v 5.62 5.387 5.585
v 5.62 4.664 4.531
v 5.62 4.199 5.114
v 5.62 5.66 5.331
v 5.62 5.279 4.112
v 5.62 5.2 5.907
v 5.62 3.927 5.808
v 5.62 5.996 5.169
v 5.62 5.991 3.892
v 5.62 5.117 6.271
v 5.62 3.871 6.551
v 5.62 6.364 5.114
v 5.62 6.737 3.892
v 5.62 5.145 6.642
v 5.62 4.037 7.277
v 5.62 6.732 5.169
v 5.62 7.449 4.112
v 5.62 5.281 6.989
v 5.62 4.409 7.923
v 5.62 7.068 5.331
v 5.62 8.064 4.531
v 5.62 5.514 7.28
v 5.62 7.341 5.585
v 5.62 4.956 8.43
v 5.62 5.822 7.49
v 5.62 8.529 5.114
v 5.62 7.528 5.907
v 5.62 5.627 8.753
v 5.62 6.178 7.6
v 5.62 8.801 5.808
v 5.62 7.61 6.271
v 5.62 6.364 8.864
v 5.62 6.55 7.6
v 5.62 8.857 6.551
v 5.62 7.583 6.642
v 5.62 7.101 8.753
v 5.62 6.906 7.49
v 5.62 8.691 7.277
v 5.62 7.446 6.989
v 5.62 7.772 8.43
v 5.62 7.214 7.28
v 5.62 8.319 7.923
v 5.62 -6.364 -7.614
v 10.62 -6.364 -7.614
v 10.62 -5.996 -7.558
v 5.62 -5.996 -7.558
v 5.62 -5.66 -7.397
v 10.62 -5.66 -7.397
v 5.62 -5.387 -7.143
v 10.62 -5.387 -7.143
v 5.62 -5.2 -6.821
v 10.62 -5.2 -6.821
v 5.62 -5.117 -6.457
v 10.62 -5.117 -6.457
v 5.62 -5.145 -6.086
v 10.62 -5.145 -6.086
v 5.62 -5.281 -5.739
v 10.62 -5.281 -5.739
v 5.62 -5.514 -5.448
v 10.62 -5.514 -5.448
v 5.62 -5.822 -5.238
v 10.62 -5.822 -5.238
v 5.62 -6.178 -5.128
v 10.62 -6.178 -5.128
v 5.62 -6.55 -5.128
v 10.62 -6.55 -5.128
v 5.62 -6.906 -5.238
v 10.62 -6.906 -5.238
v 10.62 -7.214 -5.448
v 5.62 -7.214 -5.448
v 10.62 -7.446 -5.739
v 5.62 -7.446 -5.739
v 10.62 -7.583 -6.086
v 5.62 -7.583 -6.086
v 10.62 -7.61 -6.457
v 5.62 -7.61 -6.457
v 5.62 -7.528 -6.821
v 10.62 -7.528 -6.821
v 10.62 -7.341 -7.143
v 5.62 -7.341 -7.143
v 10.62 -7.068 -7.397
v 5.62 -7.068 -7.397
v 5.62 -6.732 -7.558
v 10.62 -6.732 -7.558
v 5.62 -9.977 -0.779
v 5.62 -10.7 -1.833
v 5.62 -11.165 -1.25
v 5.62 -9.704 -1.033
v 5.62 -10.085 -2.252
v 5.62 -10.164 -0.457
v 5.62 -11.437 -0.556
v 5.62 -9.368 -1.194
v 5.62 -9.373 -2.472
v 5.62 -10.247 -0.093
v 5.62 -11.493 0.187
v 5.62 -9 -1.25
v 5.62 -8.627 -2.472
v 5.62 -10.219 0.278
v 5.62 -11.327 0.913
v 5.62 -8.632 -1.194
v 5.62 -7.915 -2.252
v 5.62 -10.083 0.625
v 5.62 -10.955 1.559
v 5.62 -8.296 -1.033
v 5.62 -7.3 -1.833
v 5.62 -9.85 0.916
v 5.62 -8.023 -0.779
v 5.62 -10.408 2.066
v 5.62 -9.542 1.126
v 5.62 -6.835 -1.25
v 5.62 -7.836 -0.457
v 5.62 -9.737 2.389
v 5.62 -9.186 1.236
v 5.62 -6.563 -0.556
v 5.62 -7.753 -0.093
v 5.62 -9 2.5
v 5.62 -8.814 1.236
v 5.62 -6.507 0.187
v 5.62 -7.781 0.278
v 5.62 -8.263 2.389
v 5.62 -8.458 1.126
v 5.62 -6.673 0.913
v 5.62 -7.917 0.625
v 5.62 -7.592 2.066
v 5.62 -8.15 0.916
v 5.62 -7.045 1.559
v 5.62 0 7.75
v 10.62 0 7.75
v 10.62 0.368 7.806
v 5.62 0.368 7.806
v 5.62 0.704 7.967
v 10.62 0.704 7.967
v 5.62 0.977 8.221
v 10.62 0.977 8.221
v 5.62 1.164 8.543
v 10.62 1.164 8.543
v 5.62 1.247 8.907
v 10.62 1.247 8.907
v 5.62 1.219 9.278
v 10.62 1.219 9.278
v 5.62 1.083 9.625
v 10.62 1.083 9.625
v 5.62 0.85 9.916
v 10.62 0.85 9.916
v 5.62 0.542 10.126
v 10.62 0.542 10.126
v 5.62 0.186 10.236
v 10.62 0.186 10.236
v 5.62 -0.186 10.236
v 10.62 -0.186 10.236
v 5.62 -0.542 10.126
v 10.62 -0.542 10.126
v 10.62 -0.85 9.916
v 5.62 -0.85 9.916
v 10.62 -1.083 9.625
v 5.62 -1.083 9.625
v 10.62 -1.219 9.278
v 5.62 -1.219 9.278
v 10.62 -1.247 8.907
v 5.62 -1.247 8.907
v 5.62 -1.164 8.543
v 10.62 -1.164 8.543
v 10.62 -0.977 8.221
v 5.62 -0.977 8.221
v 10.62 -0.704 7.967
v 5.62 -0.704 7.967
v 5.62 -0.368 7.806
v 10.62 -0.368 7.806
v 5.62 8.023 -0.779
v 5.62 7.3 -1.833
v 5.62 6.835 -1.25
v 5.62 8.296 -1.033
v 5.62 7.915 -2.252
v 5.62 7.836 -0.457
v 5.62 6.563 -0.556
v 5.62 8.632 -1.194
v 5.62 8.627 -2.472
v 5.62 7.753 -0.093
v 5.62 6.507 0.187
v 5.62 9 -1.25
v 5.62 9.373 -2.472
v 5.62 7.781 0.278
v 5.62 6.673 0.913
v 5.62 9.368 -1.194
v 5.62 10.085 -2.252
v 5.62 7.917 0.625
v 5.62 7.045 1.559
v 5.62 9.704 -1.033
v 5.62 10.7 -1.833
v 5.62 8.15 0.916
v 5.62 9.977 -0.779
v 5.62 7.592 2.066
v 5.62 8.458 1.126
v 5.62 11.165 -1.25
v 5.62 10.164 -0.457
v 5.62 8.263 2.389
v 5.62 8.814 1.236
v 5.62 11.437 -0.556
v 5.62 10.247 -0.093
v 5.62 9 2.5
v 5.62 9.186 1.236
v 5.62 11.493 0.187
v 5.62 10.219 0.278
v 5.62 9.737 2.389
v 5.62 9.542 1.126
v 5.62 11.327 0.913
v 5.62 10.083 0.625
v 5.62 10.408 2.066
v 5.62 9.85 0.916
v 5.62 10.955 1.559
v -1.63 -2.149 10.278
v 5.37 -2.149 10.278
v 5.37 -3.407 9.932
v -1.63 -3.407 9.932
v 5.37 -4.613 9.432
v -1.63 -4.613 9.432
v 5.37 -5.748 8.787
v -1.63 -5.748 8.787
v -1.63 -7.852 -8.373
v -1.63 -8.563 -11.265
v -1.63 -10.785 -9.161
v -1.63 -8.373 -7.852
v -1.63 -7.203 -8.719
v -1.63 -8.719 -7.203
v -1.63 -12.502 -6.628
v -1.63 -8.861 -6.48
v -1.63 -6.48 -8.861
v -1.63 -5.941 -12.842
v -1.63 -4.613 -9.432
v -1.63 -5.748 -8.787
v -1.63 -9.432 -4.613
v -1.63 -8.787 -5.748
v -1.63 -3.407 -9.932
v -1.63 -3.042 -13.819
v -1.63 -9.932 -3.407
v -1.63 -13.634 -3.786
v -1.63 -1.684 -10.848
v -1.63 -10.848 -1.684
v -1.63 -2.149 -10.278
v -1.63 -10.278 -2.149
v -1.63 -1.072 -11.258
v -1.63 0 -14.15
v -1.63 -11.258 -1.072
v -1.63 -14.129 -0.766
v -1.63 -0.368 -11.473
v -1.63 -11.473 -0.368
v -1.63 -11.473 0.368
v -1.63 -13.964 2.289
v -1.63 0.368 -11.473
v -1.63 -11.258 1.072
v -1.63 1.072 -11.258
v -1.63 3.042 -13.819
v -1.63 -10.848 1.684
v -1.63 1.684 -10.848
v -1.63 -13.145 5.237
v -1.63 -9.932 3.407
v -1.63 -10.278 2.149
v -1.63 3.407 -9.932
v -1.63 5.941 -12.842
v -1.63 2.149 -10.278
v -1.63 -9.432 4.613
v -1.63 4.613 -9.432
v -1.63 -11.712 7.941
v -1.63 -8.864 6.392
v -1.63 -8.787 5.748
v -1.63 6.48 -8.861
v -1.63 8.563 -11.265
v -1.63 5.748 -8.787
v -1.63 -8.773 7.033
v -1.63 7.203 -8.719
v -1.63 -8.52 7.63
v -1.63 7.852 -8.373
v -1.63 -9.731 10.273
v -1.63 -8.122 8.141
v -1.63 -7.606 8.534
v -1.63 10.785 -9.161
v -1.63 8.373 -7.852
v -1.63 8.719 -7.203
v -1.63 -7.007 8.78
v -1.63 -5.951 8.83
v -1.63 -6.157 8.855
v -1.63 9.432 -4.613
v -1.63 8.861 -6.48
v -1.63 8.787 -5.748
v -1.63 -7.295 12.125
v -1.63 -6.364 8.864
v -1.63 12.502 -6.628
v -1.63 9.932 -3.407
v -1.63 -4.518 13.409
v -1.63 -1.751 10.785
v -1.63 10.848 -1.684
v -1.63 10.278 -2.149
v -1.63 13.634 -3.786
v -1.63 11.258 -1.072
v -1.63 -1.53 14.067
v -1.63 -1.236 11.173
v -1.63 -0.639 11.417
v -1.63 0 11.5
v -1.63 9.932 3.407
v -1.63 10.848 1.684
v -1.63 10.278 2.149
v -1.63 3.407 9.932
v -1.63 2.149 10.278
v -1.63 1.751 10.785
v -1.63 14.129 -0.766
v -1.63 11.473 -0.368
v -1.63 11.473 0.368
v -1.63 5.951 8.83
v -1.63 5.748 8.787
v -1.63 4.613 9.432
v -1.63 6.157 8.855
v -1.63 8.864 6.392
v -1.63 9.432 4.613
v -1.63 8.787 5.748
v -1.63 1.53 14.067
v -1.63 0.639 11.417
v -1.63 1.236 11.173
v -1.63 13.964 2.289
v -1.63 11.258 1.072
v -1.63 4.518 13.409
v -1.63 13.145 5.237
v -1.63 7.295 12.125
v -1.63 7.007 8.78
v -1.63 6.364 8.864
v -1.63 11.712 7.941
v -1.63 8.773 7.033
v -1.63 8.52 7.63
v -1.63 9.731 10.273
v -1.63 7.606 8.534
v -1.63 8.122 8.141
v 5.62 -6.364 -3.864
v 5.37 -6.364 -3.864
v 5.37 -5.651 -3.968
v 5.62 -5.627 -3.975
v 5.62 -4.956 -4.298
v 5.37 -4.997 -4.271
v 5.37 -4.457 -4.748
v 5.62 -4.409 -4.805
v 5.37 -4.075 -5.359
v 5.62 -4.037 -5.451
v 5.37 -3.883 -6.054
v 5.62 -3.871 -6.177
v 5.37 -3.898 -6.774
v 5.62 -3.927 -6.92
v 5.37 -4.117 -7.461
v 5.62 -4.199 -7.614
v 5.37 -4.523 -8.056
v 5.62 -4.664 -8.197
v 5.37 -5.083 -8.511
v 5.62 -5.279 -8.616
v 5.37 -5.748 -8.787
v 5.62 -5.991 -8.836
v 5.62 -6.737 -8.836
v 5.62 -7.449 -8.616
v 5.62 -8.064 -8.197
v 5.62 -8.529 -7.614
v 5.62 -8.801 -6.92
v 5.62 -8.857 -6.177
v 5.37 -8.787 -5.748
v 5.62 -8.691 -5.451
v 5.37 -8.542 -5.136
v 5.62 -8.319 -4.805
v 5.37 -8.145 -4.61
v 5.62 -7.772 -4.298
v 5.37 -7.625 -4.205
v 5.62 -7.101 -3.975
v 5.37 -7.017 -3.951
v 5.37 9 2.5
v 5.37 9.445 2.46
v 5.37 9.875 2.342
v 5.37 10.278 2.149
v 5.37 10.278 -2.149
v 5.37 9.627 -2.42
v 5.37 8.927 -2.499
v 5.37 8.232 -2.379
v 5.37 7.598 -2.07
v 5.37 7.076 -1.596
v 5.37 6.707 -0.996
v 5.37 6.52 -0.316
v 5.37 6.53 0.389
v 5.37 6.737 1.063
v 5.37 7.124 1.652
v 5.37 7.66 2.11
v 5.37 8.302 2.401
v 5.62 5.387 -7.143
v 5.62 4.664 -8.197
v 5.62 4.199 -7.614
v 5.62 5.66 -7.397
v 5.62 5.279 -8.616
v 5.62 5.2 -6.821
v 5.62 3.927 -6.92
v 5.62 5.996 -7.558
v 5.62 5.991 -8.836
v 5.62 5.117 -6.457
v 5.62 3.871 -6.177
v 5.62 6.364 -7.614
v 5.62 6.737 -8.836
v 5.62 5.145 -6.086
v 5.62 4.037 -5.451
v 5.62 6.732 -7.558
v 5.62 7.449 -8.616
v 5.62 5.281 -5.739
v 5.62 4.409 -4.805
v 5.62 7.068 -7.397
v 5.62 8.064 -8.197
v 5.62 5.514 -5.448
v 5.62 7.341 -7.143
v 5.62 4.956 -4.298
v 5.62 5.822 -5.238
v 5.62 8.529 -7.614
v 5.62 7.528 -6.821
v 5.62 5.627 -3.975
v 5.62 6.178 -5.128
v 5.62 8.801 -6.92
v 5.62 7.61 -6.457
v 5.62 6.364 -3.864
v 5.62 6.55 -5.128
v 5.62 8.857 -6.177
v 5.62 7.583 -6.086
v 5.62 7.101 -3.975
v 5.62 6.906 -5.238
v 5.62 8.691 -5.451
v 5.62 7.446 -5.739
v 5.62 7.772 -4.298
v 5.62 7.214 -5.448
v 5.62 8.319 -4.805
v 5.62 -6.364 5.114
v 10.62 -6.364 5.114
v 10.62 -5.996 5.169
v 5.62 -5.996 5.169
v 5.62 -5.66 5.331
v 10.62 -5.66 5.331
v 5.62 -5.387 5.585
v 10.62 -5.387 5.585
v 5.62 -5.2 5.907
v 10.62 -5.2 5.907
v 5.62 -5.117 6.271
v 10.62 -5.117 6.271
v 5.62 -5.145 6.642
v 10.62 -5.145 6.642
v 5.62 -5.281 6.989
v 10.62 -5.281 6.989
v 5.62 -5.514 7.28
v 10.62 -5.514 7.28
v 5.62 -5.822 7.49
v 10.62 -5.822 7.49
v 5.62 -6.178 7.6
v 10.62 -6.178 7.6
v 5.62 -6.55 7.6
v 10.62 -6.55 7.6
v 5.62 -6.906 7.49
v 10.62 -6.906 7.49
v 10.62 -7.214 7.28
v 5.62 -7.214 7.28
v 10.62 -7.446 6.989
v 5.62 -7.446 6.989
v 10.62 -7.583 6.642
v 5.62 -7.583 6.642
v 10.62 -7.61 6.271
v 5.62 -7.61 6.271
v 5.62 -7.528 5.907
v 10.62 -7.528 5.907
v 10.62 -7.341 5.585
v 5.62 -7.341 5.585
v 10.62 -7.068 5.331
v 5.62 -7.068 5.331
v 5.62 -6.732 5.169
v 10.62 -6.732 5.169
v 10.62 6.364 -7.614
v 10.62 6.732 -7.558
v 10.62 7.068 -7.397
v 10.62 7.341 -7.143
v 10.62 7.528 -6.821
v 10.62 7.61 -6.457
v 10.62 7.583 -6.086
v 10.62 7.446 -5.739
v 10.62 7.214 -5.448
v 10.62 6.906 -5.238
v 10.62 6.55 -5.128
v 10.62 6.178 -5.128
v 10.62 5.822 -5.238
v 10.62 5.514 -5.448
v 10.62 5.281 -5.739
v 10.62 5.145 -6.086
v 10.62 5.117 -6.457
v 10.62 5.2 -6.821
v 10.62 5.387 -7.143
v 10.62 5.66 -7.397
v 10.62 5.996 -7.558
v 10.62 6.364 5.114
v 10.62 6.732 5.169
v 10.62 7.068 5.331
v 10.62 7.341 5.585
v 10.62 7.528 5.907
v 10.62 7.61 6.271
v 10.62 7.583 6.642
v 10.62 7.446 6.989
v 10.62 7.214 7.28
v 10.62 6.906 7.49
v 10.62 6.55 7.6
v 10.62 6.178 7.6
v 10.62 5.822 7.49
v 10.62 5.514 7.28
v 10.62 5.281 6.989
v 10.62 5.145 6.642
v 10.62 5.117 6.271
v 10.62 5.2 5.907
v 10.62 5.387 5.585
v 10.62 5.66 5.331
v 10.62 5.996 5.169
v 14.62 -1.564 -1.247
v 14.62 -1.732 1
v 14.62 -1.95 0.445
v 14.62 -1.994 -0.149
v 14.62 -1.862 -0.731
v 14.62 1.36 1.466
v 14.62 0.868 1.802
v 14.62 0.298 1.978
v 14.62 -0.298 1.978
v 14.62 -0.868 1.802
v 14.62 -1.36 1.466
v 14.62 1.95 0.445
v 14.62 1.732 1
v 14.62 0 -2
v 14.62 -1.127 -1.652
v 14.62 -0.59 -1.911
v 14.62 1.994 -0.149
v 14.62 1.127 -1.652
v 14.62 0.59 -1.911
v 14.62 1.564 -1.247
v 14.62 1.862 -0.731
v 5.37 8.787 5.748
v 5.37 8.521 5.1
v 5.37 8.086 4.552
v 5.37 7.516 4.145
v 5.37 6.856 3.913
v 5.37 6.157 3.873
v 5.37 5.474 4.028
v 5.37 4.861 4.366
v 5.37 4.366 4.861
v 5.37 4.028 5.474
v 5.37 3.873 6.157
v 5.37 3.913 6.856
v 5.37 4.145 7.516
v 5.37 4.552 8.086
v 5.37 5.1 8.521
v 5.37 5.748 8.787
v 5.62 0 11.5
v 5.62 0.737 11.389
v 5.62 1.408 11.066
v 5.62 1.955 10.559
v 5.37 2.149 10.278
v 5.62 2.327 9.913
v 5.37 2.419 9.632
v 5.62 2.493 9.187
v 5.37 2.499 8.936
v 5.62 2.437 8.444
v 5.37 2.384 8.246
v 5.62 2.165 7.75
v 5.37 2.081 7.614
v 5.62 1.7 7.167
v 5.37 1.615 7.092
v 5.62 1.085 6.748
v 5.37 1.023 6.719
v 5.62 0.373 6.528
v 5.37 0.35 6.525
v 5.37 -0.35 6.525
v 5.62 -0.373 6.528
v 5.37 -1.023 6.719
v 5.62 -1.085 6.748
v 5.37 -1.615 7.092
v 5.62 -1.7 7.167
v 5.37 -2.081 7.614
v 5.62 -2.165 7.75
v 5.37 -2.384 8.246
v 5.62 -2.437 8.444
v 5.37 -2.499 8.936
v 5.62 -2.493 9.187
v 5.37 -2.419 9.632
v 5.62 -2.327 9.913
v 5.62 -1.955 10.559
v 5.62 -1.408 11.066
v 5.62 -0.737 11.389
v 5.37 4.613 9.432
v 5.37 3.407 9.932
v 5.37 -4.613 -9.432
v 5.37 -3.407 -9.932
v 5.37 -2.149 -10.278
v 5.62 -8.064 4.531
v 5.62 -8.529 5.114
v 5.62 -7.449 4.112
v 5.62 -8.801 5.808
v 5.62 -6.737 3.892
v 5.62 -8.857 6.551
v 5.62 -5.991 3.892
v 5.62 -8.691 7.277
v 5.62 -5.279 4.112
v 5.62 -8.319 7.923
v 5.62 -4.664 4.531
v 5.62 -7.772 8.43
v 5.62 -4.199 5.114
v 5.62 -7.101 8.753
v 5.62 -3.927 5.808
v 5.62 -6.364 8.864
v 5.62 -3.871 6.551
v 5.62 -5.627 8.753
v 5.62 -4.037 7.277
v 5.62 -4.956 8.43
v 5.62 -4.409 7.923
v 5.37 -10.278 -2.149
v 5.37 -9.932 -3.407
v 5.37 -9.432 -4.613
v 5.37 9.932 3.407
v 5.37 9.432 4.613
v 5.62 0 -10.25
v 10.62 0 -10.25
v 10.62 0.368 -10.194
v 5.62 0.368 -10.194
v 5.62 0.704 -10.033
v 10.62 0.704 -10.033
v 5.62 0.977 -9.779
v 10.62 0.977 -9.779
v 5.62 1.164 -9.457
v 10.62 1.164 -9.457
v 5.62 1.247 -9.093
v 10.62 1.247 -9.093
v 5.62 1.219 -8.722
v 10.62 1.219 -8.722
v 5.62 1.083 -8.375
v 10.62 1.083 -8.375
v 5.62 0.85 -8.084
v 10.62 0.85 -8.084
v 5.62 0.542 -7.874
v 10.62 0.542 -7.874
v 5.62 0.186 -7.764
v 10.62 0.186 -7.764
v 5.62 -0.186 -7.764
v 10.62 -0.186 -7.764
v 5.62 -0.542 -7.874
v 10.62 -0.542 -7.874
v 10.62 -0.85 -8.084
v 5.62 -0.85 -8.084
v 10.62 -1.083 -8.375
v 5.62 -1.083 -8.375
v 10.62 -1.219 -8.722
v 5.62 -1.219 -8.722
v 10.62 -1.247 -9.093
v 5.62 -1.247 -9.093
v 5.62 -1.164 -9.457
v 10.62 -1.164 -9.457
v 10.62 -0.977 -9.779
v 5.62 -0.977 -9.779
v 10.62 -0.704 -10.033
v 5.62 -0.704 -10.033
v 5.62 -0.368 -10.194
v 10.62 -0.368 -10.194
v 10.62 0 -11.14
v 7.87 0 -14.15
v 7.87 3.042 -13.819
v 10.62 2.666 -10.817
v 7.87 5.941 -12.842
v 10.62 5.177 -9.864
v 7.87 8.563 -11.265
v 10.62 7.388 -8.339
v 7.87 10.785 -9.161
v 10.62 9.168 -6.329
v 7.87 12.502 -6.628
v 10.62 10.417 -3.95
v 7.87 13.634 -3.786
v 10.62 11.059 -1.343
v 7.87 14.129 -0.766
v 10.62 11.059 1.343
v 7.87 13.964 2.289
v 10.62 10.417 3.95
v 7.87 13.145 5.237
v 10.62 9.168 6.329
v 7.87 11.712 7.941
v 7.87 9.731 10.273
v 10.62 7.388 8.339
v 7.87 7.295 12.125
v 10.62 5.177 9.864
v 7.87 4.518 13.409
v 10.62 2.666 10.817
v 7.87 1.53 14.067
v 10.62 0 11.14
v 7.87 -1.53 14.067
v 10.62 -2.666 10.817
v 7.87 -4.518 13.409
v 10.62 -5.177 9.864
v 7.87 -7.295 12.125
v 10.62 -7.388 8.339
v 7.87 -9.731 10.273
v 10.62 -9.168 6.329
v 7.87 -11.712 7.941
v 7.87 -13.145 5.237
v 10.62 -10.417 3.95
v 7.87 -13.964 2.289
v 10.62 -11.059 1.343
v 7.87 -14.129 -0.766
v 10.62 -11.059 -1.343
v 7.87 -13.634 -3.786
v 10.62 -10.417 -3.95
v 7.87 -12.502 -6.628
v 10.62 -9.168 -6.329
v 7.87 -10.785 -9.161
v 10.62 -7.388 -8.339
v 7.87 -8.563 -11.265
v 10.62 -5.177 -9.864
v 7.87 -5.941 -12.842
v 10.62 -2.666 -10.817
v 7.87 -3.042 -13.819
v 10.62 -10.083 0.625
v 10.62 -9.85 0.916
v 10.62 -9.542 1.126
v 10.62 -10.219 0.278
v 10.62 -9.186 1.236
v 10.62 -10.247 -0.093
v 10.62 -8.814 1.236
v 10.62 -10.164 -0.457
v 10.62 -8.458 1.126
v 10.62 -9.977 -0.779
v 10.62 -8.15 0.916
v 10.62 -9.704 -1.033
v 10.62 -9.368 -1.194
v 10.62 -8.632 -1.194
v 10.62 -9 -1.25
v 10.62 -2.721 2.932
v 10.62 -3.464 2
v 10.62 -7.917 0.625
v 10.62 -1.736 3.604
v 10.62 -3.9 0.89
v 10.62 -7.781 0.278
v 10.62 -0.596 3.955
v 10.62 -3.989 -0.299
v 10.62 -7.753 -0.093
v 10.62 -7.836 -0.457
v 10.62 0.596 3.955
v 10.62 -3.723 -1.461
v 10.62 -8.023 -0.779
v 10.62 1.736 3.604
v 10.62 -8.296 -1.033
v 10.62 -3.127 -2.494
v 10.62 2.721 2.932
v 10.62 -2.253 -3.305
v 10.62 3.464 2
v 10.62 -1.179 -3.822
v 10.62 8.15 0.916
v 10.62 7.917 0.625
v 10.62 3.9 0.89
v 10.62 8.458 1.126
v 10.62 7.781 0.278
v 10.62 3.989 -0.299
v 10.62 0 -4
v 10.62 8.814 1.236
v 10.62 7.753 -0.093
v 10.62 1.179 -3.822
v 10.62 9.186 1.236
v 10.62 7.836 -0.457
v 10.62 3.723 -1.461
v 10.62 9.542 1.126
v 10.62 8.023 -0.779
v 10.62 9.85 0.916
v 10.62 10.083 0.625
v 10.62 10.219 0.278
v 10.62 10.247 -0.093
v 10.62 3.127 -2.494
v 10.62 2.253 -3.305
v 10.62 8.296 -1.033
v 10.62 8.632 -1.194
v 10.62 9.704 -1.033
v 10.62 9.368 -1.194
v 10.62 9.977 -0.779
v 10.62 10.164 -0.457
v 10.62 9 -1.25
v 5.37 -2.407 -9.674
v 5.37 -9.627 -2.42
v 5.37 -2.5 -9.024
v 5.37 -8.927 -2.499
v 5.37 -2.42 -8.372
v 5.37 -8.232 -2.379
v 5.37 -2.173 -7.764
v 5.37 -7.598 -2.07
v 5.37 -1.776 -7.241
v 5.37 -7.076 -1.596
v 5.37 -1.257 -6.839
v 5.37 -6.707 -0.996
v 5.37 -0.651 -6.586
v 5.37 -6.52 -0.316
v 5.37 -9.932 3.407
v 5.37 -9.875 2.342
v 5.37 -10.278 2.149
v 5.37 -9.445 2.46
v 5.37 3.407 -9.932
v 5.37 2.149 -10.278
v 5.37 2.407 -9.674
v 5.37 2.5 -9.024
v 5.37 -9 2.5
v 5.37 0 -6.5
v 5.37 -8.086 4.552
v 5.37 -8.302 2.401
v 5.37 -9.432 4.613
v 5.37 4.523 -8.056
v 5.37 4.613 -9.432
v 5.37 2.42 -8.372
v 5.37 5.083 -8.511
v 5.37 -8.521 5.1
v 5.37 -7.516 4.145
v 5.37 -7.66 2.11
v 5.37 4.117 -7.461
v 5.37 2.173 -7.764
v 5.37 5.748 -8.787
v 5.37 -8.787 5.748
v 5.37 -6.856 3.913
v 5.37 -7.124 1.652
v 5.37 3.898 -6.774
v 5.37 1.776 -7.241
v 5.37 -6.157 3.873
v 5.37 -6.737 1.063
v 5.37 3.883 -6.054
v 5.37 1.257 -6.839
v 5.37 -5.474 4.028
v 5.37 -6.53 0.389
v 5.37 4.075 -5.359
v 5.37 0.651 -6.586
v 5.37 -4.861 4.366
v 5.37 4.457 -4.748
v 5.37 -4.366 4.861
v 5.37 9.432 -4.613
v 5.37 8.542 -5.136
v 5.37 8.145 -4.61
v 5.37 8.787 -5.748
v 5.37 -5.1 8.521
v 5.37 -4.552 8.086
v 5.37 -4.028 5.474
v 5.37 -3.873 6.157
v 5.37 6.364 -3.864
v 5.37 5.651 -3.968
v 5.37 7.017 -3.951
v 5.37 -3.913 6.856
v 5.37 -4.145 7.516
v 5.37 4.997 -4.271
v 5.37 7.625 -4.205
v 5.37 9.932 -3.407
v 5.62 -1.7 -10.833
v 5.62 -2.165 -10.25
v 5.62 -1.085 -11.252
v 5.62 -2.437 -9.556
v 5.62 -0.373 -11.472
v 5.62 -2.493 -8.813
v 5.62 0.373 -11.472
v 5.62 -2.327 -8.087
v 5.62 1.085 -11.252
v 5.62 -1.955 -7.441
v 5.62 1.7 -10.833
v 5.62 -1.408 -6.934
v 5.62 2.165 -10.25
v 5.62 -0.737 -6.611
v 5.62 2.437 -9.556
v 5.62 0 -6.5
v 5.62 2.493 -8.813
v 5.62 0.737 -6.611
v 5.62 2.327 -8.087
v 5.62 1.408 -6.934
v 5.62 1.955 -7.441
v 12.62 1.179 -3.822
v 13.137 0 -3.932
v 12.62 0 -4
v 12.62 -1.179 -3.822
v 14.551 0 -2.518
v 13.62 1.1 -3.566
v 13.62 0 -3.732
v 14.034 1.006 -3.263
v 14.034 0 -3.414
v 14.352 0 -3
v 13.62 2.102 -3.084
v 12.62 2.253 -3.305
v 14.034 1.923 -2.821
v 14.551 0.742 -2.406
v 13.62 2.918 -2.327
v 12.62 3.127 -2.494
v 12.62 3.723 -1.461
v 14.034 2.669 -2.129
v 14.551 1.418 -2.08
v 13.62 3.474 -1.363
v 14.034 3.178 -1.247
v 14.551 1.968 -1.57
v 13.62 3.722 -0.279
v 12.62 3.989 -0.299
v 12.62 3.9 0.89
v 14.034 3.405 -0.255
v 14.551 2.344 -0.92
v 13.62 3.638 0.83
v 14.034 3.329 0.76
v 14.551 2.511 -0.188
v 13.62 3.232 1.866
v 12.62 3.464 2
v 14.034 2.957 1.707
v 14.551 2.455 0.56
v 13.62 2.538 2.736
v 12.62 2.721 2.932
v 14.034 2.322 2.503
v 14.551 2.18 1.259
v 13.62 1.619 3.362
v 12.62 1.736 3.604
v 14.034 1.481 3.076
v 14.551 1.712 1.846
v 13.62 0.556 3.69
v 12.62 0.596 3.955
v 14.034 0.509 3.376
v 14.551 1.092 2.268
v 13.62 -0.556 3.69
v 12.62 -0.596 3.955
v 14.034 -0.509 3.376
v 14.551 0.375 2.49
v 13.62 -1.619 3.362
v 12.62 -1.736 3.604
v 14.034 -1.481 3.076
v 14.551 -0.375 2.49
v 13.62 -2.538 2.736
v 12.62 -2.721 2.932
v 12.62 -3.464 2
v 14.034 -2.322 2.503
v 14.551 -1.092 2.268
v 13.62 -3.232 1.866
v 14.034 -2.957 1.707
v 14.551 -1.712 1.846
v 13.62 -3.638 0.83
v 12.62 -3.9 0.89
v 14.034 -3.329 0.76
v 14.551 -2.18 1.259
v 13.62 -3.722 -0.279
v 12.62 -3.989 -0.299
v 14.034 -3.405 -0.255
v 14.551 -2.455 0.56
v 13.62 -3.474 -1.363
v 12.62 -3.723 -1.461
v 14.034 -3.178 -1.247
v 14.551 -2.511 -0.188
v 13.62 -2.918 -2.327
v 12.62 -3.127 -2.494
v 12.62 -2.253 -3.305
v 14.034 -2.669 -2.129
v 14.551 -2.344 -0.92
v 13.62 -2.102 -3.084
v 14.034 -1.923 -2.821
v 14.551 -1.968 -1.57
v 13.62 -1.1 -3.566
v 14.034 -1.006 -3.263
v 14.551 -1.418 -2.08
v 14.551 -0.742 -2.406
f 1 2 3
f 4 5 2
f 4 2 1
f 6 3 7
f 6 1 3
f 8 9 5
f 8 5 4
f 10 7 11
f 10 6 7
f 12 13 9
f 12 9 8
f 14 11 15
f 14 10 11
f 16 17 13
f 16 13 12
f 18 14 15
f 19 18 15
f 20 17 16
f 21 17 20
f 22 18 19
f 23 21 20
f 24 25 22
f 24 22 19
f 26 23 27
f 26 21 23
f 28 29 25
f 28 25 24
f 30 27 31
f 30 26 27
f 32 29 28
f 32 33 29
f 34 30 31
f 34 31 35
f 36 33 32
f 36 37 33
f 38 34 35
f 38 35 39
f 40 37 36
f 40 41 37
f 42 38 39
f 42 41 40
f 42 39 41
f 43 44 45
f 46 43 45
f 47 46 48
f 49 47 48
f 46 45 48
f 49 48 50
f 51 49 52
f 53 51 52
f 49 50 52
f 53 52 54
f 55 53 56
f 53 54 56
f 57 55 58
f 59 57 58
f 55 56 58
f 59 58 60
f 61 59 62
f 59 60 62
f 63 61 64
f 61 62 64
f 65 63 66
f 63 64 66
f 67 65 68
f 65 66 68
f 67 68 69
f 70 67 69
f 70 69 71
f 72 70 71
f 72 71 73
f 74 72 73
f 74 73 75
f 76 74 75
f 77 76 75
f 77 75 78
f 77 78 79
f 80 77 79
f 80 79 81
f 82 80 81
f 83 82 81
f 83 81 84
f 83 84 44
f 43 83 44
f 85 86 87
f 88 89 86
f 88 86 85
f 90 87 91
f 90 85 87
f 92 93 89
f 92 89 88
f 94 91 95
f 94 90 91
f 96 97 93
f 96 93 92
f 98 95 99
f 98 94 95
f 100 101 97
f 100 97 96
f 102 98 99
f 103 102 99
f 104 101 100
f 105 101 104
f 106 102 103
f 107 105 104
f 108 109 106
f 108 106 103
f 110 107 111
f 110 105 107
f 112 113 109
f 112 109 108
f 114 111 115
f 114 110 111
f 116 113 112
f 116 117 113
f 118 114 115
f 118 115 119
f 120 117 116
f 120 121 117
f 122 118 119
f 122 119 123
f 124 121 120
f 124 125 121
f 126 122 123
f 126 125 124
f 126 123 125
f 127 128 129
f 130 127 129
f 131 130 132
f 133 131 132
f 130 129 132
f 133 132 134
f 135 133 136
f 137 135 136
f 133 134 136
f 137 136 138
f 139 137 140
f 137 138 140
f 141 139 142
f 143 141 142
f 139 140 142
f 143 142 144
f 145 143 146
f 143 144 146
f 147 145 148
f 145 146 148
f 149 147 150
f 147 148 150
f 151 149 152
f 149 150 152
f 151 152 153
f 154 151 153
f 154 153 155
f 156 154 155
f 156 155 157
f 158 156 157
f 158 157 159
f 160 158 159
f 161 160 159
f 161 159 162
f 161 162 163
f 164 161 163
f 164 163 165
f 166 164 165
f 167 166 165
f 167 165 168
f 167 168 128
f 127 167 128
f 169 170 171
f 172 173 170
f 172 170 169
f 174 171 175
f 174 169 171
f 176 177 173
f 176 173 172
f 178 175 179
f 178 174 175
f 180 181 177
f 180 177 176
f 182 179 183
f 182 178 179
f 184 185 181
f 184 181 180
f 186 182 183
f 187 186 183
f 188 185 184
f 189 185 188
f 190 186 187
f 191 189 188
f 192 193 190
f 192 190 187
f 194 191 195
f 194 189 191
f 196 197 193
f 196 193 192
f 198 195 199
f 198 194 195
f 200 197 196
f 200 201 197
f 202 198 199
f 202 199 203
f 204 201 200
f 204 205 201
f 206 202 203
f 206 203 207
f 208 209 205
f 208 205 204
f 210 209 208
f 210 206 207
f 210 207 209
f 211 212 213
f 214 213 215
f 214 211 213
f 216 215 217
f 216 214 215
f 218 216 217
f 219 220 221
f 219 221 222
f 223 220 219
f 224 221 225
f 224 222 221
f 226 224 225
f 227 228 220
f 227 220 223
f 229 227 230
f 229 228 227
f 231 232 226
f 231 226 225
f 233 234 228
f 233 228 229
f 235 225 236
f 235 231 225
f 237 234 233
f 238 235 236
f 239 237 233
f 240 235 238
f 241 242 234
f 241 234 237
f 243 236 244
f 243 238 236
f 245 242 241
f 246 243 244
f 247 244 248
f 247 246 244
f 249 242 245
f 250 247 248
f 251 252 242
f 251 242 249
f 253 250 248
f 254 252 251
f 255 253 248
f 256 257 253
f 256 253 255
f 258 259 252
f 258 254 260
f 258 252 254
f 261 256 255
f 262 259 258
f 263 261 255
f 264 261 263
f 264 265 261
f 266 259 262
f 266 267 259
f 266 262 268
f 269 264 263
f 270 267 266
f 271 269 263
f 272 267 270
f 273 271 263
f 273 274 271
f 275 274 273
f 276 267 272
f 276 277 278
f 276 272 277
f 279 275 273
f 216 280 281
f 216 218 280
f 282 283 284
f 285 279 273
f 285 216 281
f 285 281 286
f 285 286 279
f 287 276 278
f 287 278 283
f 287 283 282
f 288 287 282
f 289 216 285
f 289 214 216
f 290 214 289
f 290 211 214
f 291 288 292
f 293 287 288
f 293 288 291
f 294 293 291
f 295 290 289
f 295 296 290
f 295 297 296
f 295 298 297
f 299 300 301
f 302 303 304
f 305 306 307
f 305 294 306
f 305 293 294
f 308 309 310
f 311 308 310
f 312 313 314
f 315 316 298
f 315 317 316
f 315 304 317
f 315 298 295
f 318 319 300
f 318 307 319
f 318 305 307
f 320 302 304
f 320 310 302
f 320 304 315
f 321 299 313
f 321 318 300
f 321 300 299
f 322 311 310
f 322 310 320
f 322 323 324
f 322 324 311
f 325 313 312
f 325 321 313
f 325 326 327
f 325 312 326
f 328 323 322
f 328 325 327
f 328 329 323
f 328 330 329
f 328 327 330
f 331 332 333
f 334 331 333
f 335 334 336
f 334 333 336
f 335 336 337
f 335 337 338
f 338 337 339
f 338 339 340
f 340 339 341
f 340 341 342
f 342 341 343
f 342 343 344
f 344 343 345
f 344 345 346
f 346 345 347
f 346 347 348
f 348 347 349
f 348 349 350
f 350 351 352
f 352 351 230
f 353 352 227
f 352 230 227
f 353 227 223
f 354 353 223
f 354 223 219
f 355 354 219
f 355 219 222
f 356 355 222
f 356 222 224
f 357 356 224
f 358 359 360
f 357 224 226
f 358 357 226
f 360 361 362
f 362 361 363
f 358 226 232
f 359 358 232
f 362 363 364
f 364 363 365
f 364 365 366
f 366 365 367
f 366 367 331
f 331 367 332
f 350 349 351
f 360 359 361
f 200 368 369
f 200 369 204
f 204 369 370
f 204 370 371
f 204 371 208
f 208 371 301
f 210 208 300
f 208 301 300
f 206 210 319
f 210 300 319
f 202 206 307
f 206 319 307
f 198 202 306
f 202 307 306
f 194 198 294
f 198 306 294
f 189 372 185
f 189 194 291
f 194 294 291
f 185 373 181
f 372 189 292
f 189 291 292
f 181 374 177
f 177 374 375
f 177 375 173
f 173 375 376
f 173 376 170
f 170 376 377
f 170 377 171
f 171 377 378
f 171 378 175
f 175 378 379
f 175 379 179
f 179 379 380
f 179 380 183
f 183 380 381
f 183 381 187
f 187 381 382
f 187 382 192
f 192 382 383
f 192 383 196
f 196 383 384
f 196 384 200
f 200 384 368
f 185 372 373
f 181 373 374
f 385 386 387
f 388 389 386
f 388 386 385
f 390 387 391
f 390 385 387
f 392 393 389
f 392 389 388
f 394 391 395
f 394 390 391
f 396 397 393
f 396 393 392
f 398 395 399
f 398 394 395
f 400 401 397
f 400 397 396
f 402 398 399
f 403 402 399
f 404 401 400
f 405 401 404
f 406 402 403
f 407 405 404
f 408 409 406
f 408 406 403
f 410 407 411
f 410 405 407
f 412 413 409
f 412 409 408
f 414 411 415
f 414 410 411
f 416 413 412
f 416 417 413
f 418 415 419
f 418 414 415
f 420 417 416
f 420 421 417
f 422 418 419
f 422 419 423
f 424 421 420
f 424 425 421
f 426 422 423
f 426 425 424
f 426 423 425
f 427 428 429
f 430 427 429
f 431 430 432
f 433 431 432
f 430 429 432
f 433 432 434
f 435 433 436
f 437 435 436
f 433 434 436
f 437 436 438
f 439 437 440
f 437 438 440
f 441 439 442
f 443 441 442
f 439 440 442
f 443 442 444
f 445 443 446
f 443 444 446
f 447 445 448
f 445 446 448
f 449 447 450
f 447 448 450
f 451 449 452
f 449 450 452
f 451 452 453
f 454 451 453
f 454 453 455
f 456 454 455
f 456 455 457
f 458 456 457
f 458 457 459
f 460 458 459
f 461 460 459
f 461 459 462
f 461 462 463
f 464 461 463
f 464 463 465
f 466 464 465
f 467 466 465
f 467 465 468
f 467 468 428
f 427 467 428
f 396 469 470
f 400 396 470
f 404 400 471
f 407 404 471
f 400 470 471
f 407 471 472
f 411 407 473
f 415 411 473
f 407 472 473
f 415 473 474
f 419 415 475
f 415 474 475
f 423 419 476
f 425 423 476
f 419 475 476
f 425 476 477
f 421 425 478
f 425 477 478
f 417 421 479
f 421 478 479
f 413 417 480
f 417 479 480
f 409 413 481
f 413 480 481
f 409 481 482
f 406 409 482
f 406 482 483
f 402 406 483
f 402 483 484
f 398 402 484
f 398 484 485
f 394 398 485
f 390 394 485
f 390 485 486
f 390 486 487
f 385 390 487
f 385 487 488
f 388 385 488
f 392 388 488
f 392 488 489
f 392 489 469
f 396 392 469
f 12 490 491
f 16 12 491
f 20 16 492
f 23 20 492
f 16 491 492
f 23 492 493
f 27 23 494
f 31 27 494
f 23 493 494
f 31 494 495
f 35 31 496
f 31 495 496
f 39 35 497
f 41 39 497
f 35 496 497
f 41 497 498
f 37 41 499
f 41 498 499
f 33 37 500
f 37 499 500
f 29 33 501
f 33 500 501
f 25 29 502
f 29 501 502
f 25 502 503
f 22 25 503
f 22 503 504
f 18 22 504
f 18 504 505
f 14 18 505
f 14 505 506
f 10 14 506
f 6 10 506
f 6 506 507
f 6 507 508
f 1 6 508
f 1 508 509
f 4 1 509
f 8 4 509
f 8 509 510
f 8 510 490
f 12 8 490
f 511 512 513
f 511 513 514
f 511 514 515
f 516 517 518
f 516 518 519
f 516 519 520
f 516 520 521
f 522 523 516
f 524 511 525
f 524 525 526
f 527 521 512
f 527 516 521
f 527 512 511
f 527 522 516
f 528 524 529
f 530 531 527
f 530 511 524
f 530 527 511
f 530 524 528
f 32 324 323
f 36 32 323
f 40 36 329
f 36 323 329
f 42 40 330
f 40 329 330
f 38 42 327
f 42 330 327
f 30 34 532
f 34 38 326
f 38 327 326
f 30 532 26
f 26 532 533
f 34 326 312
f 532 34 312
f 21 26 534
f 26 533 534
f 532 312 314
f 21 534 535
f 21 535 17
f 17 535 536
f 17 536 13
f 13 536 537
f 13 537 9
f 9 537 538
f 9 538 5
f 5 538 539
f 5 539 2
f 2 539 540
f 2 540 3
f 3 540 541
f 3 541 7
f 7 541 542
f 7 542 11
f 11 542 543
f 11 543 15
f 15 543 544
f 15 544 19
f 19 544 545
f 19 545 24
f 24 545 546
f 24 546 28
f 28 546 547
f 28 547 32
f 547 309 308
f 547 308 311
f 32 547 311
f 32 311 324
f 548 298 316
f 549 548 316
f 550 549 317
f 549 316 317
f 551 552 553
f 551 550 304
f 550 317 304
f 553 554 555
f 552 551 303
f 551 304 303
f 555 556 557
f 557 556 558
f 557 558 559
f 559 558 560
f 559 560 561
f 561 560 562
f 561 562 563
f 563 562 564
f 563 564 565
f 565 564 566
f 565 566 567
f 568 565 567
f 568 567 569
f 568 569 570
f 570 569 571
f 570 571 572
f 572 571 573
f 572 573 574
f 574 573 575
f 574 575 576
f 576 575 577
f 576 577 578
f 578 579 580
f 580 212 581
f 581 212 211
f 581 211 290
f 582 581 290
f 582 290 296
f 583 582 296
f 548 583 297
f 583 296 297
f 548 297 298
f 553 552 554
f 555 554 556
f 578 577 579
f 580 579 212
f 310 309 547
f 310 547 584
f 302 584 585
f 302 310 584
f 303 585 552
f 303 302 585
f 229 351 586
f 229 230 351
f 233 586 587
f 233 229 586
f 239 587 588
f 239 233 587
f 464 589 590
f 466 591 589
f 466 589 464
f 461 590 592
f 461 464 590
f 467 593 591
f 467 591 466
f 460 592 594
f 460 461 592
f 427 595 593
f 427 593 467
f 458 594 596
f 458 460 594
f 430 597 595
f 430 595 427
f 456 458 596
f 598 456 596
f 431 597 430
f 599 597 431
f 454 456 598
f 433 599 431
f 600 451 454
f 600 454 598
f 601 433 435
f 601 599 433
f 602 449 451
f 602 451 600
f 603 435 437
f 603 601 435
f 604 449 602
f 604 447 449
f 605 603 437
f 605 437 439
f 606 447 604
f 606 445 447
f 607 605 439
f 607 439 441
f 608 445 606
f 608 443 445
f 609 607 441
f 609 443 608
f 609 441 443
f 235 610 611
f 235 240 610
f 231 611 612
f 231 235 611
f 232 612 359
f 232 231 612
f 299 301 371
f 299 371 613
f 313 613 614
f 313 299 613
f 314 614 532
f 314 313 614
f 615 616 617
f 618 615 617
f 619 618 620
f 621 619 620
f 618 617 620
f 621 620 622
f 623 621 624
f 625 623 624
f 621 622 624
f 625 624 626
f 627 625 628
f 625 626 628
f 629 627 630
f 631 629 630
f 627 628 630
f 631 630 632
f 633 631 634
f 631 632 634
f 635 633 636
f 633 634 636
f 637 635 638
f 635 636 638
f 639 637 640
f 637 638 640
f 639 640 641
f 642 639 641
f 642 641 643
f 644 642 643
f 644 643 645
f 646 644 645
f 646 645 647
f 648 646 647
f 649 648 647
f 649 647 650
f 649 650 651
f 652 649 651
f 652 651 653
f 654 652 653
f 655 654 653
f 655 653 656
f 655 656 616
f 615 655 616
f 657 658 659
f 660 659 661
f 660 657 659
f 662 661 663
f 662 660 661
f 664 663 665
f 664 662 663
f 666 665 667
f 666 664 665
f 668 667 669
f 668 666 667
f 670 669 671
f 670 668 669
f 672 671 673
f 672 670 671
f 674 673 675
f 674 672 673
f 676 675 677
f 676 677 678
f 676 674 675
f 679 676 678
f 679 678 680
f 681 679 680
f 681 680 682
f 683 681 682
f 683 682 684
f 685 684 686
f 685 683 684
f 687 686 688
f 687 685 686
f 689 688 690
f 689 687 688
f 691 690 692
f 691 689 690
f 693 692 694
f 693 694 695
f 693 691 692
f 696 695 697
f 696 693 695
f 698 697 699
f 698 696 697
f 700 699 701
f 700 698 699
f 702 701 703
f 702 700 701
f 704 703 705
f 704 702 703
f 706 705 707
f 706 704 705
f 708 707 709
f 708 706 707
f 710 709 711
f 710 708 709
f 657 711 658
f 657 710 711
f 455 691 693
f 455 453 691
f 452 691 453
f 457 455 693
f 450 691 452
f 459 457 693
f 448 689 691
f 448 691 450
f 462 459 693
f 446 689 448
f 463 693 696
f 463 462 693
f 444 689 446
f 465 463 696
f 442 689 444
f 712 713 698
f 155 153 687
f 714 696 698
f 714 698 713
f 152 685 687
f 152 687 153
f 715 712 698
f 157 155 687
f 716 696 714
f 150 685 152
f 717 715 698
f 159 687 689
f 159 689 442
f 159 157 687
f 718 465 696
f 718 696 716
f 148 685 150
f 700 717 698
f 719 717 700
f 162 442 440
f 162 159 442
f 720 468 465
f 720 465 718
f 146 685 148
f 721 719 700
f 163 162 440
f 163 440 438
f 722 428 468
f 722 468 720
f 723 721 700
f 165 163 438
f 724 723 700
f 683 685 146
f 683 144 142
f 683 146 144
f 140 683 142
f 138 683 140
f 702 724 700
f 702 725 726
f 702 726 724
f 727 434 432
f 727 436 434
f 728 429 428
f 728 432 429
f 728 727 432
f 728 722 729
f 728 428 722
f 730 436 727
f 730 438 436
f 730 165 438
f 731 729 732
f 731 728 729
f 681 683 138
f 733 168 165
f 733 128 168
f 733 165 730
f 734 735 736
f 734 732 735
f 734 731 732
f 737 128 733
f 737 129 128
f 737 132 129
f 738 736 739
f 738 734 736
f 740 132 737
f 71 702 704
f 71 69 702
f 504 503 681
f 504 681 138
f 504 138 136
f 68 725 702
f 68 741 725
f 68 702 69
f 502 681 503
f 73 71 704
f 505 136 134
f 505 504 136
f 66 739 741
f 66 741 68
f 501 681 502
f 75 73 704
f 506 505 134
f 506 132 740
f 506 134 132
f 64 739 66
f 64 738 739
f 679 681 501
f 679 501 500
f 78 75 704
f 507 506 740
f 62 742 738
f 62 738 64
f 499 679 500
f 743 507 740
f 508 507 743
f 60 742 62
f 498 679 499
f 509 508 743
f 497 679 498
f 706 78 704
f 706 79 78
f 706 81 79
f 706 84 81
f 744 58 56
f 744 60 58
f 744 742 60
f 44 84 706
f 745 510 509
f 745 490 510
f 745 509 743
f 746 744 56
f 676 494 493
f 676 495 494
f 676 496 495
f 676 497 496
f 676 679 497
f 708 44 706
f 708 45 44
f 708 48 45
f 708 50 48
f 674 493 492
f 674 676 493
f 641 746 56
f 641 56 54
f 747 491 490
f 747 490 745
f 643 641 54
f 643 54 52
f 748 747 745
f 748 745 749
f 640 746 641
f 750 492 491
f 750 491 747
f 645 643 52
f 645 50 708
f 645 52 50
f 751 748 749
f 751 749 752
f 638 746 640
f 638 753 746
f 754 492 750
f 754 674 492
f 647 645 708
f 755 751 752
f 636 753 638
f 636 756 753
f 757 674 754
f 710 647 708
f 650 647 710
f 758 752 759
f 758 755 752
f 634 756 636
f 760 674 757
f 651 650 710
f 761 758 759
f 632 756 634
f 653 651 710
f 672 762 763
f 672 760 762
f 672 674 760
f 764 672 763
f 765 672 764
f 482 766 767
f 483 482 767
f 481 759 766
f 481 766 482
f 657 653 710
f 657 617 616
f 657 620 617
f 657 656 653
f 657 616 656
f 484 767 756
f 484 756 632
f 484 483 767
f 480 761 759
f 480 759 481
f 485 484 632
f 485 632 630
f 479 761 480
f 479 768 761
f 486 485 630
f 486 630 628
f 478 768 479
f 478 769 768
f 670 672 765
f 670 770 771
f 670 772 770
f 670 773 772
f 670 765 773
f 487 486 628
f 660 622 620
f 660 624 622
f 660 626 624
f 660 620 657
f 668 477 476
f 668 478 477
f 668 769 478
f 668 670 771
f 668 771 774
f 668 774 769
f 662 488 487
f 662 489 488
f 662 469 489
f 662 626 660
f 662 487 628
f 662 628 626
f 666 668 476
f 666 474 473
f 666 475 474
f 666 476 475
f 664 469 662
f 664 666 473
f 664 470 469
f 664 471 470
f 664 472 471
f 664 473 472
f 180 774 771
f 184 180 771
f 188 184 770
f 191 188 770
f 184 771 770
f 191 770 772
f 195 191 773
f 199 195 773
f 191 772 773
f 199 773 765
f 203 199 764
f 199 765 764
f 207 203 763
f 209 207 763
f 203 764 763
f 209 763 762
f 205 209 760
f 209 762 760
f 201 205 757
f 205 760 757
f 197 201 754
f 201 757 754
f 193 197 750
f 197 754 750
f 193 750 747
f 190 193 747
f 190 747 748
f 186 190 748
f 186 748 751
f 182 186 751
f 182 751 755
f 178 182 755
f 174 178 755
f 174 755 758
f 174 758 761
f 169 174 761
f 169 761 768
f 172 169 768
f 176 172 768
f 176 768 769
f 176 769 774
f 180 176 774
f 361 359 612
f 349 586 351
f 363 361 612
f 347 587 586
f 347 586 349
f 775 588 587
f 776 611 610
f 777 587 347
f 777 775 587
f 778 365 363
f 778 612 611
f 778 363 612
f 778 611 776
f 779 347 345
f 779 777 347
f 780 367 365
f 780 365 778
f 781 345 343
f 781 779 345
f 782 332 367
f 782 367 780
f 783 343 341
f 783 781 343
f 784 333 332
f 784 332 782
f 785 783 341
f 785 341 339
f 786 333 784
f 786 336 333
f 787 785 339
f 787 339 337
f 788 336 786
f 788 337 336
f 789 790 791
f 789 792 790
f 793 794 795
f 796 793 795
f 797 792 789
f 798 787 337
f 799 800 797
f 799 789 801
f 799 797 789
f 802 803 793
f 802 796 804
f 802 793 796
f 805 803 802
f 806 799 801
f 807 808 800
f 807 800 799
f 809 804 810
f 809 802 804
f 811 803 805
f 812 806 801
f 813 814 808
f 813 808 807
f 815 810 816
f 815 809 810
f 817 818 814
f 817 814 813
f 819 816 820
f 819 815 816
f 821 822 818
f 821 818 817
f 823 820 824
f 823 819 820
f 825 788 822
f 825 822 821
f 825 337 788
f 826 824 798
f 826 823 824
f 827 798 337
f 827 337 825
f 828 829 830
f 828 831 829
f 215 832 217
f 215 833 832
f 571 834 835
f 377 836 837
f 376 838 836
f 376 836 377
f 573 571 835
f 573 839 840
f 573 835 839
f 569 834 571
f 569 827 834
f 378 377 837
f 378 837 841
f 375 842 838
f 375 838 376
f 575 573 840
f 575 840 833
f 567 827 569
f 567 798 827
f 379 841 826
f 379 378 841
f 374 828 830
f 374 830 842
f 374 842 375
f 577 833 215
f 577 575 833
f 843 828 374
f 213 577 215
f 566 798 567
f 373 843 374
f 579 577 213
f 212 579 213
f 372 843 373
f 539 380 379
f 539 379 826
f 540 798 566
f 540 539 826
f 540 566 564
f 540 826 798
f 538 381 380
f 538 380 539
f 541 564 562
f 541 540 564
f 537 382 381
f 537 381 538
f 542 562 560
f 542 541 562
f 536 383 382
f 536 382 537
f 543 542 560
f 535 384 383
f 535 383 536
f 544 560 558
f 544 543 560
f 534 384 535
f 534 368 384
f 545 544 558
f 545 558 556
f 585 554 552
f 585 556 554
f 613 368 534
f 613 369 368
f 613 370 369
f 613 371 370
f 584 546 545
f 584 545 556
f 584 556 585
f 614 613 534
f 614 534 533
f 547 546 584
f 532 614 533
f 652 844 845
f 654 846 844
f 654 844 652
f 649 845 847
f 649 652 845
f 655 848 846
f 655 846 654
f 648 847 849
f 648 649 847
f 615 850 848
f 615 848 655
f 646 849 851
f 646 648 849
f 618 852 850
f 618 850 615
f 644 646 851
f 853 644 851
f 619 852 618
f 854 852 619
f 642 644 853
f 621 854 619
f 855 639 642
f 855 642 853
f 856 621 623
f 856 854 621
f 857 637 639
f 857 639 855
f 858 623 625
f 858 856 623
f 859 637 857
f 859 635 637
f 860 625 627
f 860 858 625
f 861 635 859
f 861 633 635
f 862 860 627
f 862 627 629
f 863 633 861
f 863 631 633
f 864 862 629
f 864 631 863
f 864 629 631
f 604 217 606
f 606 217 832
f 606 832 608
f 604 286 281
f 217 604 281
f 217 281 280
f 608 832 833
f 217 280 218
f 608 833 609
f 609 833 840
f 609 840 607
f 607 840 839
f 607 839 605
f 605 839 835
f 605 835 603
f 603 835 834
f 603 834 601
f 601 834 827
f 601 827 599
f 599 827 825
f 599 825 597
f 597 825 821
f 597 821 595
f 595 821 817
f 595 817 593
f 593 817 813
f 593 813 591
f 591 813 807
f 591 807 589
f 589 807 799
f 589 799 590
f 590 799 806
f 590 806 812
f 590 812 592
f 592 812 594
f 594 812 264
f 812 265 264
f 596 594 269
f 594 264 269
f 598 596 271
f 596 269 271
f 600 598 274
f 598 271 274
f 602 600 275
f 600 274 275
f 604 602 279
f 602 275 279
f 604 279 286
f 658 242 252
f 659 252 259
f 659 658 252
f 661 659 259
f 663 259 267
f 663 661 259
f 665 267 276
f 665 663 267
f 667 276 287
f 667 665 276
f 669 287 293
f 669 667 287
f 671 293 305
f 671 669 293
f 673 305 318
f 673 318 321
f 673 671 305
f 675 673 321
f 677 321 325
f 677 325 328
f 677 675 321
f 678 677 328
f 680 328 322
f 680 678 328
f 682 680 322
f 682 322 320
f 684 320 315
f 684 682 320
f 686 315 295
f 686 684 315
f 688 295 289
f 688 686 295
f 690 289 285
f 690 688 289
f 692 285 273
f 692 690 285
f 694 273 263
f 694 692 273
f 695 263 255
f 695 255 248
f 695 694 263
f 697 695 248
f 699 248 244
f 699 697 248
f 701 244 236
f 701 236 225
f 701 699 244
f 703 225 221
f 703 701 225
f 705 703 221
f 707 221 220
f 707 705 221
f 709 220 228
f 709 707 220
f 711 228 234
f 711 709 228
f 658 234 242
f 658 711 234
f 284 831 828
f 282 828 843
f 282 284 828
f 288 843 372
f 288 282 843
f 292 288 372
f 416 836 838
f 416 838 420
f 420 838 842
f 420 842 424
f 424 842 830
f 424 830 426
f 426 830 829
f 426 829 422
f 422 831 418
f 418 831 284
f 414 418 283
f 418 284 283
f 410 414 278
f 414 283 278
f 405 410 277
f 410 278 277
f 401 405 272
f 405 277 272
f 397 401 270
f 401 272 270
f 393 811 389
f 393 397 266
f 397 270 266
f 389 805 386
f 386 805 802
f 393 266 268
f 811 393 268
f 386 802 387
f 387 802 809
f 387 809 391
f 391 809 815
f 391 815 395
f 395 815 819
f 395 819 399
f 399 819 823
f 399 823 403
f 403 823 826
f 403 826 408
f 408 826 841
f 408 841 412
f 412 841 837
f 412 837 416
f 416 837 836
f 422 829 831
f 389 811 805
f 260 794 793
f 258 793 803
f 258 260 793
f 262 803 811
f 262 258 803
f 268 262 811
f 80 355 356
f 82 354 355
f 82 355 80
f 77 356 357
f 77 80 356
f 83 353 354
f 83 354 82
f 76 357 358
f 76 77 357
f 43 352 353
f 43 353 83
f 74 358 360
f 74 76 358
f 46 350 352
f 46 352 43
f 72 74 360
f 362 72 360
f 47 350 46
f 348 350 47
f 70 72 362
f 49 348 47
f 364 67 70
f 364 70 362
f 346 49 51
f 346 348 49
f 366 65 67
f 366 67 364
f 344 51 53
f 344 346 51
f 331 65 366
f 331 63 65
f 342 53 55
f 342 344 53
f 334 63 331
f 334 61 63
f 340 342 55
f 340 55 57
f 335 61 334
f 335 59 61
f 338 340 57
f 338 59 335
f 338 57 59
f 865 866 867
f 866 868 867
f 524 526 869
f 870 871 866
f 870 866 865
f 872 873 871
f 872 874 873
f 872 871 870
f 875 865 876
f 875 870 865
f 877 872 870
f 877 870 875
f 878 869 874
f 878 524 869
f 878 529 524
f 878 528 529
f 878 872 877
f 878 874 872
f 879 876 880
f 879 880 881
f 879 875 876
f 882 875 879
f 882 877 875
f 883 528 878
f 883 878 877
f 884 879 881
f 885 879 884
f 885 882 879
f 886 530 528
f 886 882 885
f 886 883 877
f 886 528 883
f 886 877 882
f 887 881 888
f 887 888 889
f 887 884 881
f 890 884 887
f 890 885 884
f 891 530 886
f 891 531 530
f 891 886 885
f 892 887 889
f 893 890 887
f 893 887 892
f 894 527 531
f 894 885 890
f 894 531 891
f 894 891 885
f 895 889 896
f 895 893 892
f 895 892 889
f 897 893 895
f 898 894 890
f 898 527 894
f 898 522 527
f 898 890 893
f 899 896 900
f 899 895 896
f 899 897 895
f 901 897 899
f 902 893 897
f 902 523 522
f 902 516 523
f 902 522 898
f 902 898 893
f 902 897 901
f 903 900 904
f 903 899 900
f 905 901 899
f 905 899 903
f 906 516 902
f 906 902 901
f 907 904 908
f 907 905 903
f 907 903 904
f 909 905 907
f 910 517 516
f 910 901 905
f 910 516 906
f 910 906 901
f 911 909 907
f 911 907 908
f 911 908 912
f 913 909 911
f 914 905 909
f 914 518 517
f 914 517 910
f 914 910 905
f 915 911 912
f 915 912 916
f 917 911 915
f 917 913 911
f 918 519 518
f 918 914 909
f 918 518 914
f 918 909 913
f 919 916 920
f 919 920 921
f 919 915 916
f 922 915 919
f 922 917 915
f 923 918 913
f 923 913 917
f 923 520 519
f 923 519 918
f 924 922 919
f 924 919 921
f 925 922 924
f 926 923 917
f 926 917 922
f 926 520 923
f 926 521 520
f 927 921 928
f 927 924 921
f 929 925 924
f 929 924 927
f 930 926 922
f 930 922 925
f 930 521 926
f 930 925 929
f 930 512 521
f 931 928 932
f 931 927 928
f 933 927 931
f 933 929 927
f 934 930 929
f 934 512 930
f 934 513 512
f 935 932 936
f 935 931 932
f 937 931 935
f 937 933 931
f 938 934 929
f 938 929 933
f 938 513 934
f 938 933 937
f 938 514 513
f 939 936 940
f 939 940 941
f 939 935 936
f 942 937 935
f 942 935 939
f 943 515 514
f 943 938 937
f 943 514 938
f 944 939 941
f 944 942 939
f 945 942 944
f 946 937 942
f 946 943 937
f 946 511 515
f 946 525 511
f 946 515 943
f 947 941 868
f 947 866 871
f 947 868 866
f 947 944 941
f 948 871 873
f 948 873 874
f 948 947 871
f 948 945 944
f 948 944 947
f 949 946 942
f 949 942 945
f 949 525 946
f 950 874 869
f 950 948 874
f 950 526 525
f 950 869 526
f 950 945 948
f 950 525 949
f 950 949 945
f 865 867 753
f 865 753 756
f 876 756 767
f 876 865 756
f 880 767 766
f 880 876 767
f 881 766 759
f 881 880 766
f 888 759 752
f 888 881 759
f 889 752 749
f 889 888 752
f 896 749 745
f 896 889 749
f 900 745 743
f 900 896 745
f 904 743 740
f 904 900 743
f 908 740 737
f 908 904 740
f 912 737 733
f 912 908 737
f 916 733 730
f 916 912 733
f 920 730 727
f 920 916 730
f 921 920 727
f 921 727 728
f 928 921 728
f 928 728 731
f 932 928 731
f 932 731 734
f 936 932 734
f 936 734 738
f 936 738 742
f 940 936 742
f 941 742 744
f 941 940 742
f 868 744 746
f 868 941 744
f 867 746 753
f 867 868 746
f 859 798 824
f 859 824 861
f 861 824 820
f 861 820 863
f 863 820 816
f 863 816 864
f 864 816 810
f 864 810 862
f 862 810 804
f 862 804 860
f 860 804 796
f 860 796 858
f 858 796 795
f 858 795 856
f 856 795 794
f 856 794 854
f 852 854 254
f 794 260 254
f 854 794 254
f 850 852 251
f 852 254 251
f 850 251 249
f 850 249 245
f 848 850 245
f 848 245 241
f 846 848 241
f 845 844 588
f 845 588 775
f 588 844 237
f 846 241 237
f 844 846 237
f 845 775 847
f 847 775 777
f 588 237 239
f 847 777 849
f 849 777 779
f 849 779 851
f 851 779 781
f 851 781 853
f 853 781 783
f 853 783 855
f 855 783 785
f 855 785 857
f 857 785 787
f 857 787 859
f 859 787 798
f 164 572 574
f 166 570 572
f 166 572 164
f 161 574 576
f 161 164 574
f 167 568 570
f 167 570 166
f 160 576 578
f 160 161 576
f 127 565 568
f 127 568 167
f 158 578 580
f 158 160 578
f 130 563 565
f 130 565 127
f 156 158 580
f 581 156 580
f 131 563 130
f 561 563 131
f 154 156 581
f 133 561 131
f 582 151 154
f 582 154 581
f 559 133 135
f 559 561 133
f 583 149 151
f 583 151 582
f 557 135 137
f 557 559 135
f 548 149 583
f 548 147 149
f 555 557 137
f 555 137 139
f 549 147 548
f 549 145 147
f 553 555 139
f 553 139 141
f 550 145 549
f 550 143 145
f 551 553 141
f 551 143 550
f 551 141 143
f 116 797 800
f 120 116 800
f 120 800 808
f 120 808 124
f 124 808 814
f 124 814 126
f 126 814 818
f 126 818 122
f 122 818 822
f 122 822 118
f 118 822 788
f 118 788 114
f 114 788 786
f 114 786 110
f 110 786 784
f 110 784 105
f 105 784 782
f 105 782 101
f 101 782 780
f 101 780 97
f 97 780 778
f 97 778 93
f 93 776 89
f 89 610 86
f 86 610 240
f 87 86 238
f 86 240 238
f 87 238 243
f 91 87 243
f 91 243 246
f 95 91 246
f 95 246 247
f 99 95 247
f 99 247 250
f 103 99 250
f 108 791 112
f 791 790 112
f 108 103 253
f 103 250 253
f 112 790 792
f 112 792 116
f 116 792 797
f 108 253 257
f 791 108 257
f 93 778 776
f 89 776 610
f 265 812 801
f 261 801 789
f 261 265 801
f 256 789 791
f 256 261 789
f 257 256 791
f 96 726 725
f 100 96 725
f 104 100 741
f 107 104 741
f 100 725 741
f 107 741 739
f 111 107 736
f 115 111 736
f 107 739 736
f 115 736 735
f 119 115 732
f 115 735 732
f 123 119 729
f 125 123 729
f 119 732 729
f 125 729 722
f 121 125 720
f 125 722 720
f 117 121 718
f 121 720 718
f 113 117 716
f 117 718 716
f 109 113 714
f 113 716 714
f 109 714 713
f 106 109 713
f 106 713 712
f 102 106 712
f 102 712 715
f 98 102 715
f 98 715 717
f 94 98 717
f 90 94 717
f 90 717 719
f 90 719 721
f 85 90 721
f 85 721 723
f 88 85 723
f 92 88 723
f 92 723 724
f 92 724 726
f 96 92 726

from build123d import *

# Parameters (mm, degrees)
FILLET1_R          = 2
SKETCH2_R          = 1.25
CUT_EXTRUDE1_DEPTH = 12.25
SKETCH3_R          = 2.5
CUT_EXTRUDE2_DEPTH = 7.25


with BuildPart() as part:
    # Sketch1 → Revolve1 (revolve)
    with BuildSketch(Plane(origin=(0, 0, 0), x_dir=(1, 0, 0), z_dir=(0, 1, 0))):
        Polygon((-1.630434783, 14.15), (7.869565217, 14.15), (10.619565217, 11.140476118), (10.619565217, 4), (14.619565217, 4), (14.619565217, 0), (13.372742768, 0), (5.369565217, 0), (5.369565217, 10.5), (-1.630434783, 10.5), align=None)
    revolve(axis=Axis((-12.391304348, 0, 0), (1, 0, 0)))

    # Fillet1
    fillet1_edges = [part.edges().sort_by_distance(p)[0] for p in [
        (14.619565217, 0, 4),
    ]]
    fillet(fillet1_edges, radius=FILLET1_R)

    # Sketch2 → Cut-Extrude1 (cut)
    with BuildSketch(Plane(origin=(10.619565217, 0, 0), x_dir=(0, 0, -1), z_dir=(1, 0, 0))):
        with Locations((0, 9)):
            Circle(SKETCH2_R)
        with Locations((6.363961031, 6.363961031)):
            Circle(SKETCH2_R)
        with Locations((9, 0)):
            Circle(SKETCH2_R)
        with Locations((6.363961031, -6.363961031)):
            Circle(SKETCH2_R)
        with Locations((0, -9)):
            Circle(SKETCH2_R)
        with Locations((-6.363961031, -6.363961031)):
            Circle(SKETCH2_R)
        with Locations((-9, 0)):
            Circle(SKETCH2_R)
        with Locations((-6.363961031, 6.363961031)):
            Circle(SKETCH2_R)
    extrude(amount=-CUT_EXTRUDE1_DEPTH, mode=Mode.SUBTRACT)

    # Sketch3 → Cut-Extrude2 (cut)
    with BuildSketch(Plane.ZY.offset(1.630434783)):
        with Locations((0, 9)):
            Circle(SKETCH3_R)
        with Locations((6.363961031, 6.363961031)):
            Circle(SKETCH3_R)
        with Locations((9, 0)):
            Circle(SKETCH3_R)
        with Locations((6.363961031, -6.363961031)):
            Circle(SKETCH3_R)
        with Locations((0, -9)):
            Circle(SKETCH3_R)
        with Locations((-6.363961031, -6.363961031)):
            Circle(SKETCH3_R)
        with Locations((-9, 0)):
            Circle(SKETCH3_R)
        with Locations((-6.363961031, 6.363961031)):
            Circle(SKETCH3_R)
    extrude(amount=-CUT_EXTRUDE2_DEPTH, mode=Mode.SUBTRACT)


solid = part.part
